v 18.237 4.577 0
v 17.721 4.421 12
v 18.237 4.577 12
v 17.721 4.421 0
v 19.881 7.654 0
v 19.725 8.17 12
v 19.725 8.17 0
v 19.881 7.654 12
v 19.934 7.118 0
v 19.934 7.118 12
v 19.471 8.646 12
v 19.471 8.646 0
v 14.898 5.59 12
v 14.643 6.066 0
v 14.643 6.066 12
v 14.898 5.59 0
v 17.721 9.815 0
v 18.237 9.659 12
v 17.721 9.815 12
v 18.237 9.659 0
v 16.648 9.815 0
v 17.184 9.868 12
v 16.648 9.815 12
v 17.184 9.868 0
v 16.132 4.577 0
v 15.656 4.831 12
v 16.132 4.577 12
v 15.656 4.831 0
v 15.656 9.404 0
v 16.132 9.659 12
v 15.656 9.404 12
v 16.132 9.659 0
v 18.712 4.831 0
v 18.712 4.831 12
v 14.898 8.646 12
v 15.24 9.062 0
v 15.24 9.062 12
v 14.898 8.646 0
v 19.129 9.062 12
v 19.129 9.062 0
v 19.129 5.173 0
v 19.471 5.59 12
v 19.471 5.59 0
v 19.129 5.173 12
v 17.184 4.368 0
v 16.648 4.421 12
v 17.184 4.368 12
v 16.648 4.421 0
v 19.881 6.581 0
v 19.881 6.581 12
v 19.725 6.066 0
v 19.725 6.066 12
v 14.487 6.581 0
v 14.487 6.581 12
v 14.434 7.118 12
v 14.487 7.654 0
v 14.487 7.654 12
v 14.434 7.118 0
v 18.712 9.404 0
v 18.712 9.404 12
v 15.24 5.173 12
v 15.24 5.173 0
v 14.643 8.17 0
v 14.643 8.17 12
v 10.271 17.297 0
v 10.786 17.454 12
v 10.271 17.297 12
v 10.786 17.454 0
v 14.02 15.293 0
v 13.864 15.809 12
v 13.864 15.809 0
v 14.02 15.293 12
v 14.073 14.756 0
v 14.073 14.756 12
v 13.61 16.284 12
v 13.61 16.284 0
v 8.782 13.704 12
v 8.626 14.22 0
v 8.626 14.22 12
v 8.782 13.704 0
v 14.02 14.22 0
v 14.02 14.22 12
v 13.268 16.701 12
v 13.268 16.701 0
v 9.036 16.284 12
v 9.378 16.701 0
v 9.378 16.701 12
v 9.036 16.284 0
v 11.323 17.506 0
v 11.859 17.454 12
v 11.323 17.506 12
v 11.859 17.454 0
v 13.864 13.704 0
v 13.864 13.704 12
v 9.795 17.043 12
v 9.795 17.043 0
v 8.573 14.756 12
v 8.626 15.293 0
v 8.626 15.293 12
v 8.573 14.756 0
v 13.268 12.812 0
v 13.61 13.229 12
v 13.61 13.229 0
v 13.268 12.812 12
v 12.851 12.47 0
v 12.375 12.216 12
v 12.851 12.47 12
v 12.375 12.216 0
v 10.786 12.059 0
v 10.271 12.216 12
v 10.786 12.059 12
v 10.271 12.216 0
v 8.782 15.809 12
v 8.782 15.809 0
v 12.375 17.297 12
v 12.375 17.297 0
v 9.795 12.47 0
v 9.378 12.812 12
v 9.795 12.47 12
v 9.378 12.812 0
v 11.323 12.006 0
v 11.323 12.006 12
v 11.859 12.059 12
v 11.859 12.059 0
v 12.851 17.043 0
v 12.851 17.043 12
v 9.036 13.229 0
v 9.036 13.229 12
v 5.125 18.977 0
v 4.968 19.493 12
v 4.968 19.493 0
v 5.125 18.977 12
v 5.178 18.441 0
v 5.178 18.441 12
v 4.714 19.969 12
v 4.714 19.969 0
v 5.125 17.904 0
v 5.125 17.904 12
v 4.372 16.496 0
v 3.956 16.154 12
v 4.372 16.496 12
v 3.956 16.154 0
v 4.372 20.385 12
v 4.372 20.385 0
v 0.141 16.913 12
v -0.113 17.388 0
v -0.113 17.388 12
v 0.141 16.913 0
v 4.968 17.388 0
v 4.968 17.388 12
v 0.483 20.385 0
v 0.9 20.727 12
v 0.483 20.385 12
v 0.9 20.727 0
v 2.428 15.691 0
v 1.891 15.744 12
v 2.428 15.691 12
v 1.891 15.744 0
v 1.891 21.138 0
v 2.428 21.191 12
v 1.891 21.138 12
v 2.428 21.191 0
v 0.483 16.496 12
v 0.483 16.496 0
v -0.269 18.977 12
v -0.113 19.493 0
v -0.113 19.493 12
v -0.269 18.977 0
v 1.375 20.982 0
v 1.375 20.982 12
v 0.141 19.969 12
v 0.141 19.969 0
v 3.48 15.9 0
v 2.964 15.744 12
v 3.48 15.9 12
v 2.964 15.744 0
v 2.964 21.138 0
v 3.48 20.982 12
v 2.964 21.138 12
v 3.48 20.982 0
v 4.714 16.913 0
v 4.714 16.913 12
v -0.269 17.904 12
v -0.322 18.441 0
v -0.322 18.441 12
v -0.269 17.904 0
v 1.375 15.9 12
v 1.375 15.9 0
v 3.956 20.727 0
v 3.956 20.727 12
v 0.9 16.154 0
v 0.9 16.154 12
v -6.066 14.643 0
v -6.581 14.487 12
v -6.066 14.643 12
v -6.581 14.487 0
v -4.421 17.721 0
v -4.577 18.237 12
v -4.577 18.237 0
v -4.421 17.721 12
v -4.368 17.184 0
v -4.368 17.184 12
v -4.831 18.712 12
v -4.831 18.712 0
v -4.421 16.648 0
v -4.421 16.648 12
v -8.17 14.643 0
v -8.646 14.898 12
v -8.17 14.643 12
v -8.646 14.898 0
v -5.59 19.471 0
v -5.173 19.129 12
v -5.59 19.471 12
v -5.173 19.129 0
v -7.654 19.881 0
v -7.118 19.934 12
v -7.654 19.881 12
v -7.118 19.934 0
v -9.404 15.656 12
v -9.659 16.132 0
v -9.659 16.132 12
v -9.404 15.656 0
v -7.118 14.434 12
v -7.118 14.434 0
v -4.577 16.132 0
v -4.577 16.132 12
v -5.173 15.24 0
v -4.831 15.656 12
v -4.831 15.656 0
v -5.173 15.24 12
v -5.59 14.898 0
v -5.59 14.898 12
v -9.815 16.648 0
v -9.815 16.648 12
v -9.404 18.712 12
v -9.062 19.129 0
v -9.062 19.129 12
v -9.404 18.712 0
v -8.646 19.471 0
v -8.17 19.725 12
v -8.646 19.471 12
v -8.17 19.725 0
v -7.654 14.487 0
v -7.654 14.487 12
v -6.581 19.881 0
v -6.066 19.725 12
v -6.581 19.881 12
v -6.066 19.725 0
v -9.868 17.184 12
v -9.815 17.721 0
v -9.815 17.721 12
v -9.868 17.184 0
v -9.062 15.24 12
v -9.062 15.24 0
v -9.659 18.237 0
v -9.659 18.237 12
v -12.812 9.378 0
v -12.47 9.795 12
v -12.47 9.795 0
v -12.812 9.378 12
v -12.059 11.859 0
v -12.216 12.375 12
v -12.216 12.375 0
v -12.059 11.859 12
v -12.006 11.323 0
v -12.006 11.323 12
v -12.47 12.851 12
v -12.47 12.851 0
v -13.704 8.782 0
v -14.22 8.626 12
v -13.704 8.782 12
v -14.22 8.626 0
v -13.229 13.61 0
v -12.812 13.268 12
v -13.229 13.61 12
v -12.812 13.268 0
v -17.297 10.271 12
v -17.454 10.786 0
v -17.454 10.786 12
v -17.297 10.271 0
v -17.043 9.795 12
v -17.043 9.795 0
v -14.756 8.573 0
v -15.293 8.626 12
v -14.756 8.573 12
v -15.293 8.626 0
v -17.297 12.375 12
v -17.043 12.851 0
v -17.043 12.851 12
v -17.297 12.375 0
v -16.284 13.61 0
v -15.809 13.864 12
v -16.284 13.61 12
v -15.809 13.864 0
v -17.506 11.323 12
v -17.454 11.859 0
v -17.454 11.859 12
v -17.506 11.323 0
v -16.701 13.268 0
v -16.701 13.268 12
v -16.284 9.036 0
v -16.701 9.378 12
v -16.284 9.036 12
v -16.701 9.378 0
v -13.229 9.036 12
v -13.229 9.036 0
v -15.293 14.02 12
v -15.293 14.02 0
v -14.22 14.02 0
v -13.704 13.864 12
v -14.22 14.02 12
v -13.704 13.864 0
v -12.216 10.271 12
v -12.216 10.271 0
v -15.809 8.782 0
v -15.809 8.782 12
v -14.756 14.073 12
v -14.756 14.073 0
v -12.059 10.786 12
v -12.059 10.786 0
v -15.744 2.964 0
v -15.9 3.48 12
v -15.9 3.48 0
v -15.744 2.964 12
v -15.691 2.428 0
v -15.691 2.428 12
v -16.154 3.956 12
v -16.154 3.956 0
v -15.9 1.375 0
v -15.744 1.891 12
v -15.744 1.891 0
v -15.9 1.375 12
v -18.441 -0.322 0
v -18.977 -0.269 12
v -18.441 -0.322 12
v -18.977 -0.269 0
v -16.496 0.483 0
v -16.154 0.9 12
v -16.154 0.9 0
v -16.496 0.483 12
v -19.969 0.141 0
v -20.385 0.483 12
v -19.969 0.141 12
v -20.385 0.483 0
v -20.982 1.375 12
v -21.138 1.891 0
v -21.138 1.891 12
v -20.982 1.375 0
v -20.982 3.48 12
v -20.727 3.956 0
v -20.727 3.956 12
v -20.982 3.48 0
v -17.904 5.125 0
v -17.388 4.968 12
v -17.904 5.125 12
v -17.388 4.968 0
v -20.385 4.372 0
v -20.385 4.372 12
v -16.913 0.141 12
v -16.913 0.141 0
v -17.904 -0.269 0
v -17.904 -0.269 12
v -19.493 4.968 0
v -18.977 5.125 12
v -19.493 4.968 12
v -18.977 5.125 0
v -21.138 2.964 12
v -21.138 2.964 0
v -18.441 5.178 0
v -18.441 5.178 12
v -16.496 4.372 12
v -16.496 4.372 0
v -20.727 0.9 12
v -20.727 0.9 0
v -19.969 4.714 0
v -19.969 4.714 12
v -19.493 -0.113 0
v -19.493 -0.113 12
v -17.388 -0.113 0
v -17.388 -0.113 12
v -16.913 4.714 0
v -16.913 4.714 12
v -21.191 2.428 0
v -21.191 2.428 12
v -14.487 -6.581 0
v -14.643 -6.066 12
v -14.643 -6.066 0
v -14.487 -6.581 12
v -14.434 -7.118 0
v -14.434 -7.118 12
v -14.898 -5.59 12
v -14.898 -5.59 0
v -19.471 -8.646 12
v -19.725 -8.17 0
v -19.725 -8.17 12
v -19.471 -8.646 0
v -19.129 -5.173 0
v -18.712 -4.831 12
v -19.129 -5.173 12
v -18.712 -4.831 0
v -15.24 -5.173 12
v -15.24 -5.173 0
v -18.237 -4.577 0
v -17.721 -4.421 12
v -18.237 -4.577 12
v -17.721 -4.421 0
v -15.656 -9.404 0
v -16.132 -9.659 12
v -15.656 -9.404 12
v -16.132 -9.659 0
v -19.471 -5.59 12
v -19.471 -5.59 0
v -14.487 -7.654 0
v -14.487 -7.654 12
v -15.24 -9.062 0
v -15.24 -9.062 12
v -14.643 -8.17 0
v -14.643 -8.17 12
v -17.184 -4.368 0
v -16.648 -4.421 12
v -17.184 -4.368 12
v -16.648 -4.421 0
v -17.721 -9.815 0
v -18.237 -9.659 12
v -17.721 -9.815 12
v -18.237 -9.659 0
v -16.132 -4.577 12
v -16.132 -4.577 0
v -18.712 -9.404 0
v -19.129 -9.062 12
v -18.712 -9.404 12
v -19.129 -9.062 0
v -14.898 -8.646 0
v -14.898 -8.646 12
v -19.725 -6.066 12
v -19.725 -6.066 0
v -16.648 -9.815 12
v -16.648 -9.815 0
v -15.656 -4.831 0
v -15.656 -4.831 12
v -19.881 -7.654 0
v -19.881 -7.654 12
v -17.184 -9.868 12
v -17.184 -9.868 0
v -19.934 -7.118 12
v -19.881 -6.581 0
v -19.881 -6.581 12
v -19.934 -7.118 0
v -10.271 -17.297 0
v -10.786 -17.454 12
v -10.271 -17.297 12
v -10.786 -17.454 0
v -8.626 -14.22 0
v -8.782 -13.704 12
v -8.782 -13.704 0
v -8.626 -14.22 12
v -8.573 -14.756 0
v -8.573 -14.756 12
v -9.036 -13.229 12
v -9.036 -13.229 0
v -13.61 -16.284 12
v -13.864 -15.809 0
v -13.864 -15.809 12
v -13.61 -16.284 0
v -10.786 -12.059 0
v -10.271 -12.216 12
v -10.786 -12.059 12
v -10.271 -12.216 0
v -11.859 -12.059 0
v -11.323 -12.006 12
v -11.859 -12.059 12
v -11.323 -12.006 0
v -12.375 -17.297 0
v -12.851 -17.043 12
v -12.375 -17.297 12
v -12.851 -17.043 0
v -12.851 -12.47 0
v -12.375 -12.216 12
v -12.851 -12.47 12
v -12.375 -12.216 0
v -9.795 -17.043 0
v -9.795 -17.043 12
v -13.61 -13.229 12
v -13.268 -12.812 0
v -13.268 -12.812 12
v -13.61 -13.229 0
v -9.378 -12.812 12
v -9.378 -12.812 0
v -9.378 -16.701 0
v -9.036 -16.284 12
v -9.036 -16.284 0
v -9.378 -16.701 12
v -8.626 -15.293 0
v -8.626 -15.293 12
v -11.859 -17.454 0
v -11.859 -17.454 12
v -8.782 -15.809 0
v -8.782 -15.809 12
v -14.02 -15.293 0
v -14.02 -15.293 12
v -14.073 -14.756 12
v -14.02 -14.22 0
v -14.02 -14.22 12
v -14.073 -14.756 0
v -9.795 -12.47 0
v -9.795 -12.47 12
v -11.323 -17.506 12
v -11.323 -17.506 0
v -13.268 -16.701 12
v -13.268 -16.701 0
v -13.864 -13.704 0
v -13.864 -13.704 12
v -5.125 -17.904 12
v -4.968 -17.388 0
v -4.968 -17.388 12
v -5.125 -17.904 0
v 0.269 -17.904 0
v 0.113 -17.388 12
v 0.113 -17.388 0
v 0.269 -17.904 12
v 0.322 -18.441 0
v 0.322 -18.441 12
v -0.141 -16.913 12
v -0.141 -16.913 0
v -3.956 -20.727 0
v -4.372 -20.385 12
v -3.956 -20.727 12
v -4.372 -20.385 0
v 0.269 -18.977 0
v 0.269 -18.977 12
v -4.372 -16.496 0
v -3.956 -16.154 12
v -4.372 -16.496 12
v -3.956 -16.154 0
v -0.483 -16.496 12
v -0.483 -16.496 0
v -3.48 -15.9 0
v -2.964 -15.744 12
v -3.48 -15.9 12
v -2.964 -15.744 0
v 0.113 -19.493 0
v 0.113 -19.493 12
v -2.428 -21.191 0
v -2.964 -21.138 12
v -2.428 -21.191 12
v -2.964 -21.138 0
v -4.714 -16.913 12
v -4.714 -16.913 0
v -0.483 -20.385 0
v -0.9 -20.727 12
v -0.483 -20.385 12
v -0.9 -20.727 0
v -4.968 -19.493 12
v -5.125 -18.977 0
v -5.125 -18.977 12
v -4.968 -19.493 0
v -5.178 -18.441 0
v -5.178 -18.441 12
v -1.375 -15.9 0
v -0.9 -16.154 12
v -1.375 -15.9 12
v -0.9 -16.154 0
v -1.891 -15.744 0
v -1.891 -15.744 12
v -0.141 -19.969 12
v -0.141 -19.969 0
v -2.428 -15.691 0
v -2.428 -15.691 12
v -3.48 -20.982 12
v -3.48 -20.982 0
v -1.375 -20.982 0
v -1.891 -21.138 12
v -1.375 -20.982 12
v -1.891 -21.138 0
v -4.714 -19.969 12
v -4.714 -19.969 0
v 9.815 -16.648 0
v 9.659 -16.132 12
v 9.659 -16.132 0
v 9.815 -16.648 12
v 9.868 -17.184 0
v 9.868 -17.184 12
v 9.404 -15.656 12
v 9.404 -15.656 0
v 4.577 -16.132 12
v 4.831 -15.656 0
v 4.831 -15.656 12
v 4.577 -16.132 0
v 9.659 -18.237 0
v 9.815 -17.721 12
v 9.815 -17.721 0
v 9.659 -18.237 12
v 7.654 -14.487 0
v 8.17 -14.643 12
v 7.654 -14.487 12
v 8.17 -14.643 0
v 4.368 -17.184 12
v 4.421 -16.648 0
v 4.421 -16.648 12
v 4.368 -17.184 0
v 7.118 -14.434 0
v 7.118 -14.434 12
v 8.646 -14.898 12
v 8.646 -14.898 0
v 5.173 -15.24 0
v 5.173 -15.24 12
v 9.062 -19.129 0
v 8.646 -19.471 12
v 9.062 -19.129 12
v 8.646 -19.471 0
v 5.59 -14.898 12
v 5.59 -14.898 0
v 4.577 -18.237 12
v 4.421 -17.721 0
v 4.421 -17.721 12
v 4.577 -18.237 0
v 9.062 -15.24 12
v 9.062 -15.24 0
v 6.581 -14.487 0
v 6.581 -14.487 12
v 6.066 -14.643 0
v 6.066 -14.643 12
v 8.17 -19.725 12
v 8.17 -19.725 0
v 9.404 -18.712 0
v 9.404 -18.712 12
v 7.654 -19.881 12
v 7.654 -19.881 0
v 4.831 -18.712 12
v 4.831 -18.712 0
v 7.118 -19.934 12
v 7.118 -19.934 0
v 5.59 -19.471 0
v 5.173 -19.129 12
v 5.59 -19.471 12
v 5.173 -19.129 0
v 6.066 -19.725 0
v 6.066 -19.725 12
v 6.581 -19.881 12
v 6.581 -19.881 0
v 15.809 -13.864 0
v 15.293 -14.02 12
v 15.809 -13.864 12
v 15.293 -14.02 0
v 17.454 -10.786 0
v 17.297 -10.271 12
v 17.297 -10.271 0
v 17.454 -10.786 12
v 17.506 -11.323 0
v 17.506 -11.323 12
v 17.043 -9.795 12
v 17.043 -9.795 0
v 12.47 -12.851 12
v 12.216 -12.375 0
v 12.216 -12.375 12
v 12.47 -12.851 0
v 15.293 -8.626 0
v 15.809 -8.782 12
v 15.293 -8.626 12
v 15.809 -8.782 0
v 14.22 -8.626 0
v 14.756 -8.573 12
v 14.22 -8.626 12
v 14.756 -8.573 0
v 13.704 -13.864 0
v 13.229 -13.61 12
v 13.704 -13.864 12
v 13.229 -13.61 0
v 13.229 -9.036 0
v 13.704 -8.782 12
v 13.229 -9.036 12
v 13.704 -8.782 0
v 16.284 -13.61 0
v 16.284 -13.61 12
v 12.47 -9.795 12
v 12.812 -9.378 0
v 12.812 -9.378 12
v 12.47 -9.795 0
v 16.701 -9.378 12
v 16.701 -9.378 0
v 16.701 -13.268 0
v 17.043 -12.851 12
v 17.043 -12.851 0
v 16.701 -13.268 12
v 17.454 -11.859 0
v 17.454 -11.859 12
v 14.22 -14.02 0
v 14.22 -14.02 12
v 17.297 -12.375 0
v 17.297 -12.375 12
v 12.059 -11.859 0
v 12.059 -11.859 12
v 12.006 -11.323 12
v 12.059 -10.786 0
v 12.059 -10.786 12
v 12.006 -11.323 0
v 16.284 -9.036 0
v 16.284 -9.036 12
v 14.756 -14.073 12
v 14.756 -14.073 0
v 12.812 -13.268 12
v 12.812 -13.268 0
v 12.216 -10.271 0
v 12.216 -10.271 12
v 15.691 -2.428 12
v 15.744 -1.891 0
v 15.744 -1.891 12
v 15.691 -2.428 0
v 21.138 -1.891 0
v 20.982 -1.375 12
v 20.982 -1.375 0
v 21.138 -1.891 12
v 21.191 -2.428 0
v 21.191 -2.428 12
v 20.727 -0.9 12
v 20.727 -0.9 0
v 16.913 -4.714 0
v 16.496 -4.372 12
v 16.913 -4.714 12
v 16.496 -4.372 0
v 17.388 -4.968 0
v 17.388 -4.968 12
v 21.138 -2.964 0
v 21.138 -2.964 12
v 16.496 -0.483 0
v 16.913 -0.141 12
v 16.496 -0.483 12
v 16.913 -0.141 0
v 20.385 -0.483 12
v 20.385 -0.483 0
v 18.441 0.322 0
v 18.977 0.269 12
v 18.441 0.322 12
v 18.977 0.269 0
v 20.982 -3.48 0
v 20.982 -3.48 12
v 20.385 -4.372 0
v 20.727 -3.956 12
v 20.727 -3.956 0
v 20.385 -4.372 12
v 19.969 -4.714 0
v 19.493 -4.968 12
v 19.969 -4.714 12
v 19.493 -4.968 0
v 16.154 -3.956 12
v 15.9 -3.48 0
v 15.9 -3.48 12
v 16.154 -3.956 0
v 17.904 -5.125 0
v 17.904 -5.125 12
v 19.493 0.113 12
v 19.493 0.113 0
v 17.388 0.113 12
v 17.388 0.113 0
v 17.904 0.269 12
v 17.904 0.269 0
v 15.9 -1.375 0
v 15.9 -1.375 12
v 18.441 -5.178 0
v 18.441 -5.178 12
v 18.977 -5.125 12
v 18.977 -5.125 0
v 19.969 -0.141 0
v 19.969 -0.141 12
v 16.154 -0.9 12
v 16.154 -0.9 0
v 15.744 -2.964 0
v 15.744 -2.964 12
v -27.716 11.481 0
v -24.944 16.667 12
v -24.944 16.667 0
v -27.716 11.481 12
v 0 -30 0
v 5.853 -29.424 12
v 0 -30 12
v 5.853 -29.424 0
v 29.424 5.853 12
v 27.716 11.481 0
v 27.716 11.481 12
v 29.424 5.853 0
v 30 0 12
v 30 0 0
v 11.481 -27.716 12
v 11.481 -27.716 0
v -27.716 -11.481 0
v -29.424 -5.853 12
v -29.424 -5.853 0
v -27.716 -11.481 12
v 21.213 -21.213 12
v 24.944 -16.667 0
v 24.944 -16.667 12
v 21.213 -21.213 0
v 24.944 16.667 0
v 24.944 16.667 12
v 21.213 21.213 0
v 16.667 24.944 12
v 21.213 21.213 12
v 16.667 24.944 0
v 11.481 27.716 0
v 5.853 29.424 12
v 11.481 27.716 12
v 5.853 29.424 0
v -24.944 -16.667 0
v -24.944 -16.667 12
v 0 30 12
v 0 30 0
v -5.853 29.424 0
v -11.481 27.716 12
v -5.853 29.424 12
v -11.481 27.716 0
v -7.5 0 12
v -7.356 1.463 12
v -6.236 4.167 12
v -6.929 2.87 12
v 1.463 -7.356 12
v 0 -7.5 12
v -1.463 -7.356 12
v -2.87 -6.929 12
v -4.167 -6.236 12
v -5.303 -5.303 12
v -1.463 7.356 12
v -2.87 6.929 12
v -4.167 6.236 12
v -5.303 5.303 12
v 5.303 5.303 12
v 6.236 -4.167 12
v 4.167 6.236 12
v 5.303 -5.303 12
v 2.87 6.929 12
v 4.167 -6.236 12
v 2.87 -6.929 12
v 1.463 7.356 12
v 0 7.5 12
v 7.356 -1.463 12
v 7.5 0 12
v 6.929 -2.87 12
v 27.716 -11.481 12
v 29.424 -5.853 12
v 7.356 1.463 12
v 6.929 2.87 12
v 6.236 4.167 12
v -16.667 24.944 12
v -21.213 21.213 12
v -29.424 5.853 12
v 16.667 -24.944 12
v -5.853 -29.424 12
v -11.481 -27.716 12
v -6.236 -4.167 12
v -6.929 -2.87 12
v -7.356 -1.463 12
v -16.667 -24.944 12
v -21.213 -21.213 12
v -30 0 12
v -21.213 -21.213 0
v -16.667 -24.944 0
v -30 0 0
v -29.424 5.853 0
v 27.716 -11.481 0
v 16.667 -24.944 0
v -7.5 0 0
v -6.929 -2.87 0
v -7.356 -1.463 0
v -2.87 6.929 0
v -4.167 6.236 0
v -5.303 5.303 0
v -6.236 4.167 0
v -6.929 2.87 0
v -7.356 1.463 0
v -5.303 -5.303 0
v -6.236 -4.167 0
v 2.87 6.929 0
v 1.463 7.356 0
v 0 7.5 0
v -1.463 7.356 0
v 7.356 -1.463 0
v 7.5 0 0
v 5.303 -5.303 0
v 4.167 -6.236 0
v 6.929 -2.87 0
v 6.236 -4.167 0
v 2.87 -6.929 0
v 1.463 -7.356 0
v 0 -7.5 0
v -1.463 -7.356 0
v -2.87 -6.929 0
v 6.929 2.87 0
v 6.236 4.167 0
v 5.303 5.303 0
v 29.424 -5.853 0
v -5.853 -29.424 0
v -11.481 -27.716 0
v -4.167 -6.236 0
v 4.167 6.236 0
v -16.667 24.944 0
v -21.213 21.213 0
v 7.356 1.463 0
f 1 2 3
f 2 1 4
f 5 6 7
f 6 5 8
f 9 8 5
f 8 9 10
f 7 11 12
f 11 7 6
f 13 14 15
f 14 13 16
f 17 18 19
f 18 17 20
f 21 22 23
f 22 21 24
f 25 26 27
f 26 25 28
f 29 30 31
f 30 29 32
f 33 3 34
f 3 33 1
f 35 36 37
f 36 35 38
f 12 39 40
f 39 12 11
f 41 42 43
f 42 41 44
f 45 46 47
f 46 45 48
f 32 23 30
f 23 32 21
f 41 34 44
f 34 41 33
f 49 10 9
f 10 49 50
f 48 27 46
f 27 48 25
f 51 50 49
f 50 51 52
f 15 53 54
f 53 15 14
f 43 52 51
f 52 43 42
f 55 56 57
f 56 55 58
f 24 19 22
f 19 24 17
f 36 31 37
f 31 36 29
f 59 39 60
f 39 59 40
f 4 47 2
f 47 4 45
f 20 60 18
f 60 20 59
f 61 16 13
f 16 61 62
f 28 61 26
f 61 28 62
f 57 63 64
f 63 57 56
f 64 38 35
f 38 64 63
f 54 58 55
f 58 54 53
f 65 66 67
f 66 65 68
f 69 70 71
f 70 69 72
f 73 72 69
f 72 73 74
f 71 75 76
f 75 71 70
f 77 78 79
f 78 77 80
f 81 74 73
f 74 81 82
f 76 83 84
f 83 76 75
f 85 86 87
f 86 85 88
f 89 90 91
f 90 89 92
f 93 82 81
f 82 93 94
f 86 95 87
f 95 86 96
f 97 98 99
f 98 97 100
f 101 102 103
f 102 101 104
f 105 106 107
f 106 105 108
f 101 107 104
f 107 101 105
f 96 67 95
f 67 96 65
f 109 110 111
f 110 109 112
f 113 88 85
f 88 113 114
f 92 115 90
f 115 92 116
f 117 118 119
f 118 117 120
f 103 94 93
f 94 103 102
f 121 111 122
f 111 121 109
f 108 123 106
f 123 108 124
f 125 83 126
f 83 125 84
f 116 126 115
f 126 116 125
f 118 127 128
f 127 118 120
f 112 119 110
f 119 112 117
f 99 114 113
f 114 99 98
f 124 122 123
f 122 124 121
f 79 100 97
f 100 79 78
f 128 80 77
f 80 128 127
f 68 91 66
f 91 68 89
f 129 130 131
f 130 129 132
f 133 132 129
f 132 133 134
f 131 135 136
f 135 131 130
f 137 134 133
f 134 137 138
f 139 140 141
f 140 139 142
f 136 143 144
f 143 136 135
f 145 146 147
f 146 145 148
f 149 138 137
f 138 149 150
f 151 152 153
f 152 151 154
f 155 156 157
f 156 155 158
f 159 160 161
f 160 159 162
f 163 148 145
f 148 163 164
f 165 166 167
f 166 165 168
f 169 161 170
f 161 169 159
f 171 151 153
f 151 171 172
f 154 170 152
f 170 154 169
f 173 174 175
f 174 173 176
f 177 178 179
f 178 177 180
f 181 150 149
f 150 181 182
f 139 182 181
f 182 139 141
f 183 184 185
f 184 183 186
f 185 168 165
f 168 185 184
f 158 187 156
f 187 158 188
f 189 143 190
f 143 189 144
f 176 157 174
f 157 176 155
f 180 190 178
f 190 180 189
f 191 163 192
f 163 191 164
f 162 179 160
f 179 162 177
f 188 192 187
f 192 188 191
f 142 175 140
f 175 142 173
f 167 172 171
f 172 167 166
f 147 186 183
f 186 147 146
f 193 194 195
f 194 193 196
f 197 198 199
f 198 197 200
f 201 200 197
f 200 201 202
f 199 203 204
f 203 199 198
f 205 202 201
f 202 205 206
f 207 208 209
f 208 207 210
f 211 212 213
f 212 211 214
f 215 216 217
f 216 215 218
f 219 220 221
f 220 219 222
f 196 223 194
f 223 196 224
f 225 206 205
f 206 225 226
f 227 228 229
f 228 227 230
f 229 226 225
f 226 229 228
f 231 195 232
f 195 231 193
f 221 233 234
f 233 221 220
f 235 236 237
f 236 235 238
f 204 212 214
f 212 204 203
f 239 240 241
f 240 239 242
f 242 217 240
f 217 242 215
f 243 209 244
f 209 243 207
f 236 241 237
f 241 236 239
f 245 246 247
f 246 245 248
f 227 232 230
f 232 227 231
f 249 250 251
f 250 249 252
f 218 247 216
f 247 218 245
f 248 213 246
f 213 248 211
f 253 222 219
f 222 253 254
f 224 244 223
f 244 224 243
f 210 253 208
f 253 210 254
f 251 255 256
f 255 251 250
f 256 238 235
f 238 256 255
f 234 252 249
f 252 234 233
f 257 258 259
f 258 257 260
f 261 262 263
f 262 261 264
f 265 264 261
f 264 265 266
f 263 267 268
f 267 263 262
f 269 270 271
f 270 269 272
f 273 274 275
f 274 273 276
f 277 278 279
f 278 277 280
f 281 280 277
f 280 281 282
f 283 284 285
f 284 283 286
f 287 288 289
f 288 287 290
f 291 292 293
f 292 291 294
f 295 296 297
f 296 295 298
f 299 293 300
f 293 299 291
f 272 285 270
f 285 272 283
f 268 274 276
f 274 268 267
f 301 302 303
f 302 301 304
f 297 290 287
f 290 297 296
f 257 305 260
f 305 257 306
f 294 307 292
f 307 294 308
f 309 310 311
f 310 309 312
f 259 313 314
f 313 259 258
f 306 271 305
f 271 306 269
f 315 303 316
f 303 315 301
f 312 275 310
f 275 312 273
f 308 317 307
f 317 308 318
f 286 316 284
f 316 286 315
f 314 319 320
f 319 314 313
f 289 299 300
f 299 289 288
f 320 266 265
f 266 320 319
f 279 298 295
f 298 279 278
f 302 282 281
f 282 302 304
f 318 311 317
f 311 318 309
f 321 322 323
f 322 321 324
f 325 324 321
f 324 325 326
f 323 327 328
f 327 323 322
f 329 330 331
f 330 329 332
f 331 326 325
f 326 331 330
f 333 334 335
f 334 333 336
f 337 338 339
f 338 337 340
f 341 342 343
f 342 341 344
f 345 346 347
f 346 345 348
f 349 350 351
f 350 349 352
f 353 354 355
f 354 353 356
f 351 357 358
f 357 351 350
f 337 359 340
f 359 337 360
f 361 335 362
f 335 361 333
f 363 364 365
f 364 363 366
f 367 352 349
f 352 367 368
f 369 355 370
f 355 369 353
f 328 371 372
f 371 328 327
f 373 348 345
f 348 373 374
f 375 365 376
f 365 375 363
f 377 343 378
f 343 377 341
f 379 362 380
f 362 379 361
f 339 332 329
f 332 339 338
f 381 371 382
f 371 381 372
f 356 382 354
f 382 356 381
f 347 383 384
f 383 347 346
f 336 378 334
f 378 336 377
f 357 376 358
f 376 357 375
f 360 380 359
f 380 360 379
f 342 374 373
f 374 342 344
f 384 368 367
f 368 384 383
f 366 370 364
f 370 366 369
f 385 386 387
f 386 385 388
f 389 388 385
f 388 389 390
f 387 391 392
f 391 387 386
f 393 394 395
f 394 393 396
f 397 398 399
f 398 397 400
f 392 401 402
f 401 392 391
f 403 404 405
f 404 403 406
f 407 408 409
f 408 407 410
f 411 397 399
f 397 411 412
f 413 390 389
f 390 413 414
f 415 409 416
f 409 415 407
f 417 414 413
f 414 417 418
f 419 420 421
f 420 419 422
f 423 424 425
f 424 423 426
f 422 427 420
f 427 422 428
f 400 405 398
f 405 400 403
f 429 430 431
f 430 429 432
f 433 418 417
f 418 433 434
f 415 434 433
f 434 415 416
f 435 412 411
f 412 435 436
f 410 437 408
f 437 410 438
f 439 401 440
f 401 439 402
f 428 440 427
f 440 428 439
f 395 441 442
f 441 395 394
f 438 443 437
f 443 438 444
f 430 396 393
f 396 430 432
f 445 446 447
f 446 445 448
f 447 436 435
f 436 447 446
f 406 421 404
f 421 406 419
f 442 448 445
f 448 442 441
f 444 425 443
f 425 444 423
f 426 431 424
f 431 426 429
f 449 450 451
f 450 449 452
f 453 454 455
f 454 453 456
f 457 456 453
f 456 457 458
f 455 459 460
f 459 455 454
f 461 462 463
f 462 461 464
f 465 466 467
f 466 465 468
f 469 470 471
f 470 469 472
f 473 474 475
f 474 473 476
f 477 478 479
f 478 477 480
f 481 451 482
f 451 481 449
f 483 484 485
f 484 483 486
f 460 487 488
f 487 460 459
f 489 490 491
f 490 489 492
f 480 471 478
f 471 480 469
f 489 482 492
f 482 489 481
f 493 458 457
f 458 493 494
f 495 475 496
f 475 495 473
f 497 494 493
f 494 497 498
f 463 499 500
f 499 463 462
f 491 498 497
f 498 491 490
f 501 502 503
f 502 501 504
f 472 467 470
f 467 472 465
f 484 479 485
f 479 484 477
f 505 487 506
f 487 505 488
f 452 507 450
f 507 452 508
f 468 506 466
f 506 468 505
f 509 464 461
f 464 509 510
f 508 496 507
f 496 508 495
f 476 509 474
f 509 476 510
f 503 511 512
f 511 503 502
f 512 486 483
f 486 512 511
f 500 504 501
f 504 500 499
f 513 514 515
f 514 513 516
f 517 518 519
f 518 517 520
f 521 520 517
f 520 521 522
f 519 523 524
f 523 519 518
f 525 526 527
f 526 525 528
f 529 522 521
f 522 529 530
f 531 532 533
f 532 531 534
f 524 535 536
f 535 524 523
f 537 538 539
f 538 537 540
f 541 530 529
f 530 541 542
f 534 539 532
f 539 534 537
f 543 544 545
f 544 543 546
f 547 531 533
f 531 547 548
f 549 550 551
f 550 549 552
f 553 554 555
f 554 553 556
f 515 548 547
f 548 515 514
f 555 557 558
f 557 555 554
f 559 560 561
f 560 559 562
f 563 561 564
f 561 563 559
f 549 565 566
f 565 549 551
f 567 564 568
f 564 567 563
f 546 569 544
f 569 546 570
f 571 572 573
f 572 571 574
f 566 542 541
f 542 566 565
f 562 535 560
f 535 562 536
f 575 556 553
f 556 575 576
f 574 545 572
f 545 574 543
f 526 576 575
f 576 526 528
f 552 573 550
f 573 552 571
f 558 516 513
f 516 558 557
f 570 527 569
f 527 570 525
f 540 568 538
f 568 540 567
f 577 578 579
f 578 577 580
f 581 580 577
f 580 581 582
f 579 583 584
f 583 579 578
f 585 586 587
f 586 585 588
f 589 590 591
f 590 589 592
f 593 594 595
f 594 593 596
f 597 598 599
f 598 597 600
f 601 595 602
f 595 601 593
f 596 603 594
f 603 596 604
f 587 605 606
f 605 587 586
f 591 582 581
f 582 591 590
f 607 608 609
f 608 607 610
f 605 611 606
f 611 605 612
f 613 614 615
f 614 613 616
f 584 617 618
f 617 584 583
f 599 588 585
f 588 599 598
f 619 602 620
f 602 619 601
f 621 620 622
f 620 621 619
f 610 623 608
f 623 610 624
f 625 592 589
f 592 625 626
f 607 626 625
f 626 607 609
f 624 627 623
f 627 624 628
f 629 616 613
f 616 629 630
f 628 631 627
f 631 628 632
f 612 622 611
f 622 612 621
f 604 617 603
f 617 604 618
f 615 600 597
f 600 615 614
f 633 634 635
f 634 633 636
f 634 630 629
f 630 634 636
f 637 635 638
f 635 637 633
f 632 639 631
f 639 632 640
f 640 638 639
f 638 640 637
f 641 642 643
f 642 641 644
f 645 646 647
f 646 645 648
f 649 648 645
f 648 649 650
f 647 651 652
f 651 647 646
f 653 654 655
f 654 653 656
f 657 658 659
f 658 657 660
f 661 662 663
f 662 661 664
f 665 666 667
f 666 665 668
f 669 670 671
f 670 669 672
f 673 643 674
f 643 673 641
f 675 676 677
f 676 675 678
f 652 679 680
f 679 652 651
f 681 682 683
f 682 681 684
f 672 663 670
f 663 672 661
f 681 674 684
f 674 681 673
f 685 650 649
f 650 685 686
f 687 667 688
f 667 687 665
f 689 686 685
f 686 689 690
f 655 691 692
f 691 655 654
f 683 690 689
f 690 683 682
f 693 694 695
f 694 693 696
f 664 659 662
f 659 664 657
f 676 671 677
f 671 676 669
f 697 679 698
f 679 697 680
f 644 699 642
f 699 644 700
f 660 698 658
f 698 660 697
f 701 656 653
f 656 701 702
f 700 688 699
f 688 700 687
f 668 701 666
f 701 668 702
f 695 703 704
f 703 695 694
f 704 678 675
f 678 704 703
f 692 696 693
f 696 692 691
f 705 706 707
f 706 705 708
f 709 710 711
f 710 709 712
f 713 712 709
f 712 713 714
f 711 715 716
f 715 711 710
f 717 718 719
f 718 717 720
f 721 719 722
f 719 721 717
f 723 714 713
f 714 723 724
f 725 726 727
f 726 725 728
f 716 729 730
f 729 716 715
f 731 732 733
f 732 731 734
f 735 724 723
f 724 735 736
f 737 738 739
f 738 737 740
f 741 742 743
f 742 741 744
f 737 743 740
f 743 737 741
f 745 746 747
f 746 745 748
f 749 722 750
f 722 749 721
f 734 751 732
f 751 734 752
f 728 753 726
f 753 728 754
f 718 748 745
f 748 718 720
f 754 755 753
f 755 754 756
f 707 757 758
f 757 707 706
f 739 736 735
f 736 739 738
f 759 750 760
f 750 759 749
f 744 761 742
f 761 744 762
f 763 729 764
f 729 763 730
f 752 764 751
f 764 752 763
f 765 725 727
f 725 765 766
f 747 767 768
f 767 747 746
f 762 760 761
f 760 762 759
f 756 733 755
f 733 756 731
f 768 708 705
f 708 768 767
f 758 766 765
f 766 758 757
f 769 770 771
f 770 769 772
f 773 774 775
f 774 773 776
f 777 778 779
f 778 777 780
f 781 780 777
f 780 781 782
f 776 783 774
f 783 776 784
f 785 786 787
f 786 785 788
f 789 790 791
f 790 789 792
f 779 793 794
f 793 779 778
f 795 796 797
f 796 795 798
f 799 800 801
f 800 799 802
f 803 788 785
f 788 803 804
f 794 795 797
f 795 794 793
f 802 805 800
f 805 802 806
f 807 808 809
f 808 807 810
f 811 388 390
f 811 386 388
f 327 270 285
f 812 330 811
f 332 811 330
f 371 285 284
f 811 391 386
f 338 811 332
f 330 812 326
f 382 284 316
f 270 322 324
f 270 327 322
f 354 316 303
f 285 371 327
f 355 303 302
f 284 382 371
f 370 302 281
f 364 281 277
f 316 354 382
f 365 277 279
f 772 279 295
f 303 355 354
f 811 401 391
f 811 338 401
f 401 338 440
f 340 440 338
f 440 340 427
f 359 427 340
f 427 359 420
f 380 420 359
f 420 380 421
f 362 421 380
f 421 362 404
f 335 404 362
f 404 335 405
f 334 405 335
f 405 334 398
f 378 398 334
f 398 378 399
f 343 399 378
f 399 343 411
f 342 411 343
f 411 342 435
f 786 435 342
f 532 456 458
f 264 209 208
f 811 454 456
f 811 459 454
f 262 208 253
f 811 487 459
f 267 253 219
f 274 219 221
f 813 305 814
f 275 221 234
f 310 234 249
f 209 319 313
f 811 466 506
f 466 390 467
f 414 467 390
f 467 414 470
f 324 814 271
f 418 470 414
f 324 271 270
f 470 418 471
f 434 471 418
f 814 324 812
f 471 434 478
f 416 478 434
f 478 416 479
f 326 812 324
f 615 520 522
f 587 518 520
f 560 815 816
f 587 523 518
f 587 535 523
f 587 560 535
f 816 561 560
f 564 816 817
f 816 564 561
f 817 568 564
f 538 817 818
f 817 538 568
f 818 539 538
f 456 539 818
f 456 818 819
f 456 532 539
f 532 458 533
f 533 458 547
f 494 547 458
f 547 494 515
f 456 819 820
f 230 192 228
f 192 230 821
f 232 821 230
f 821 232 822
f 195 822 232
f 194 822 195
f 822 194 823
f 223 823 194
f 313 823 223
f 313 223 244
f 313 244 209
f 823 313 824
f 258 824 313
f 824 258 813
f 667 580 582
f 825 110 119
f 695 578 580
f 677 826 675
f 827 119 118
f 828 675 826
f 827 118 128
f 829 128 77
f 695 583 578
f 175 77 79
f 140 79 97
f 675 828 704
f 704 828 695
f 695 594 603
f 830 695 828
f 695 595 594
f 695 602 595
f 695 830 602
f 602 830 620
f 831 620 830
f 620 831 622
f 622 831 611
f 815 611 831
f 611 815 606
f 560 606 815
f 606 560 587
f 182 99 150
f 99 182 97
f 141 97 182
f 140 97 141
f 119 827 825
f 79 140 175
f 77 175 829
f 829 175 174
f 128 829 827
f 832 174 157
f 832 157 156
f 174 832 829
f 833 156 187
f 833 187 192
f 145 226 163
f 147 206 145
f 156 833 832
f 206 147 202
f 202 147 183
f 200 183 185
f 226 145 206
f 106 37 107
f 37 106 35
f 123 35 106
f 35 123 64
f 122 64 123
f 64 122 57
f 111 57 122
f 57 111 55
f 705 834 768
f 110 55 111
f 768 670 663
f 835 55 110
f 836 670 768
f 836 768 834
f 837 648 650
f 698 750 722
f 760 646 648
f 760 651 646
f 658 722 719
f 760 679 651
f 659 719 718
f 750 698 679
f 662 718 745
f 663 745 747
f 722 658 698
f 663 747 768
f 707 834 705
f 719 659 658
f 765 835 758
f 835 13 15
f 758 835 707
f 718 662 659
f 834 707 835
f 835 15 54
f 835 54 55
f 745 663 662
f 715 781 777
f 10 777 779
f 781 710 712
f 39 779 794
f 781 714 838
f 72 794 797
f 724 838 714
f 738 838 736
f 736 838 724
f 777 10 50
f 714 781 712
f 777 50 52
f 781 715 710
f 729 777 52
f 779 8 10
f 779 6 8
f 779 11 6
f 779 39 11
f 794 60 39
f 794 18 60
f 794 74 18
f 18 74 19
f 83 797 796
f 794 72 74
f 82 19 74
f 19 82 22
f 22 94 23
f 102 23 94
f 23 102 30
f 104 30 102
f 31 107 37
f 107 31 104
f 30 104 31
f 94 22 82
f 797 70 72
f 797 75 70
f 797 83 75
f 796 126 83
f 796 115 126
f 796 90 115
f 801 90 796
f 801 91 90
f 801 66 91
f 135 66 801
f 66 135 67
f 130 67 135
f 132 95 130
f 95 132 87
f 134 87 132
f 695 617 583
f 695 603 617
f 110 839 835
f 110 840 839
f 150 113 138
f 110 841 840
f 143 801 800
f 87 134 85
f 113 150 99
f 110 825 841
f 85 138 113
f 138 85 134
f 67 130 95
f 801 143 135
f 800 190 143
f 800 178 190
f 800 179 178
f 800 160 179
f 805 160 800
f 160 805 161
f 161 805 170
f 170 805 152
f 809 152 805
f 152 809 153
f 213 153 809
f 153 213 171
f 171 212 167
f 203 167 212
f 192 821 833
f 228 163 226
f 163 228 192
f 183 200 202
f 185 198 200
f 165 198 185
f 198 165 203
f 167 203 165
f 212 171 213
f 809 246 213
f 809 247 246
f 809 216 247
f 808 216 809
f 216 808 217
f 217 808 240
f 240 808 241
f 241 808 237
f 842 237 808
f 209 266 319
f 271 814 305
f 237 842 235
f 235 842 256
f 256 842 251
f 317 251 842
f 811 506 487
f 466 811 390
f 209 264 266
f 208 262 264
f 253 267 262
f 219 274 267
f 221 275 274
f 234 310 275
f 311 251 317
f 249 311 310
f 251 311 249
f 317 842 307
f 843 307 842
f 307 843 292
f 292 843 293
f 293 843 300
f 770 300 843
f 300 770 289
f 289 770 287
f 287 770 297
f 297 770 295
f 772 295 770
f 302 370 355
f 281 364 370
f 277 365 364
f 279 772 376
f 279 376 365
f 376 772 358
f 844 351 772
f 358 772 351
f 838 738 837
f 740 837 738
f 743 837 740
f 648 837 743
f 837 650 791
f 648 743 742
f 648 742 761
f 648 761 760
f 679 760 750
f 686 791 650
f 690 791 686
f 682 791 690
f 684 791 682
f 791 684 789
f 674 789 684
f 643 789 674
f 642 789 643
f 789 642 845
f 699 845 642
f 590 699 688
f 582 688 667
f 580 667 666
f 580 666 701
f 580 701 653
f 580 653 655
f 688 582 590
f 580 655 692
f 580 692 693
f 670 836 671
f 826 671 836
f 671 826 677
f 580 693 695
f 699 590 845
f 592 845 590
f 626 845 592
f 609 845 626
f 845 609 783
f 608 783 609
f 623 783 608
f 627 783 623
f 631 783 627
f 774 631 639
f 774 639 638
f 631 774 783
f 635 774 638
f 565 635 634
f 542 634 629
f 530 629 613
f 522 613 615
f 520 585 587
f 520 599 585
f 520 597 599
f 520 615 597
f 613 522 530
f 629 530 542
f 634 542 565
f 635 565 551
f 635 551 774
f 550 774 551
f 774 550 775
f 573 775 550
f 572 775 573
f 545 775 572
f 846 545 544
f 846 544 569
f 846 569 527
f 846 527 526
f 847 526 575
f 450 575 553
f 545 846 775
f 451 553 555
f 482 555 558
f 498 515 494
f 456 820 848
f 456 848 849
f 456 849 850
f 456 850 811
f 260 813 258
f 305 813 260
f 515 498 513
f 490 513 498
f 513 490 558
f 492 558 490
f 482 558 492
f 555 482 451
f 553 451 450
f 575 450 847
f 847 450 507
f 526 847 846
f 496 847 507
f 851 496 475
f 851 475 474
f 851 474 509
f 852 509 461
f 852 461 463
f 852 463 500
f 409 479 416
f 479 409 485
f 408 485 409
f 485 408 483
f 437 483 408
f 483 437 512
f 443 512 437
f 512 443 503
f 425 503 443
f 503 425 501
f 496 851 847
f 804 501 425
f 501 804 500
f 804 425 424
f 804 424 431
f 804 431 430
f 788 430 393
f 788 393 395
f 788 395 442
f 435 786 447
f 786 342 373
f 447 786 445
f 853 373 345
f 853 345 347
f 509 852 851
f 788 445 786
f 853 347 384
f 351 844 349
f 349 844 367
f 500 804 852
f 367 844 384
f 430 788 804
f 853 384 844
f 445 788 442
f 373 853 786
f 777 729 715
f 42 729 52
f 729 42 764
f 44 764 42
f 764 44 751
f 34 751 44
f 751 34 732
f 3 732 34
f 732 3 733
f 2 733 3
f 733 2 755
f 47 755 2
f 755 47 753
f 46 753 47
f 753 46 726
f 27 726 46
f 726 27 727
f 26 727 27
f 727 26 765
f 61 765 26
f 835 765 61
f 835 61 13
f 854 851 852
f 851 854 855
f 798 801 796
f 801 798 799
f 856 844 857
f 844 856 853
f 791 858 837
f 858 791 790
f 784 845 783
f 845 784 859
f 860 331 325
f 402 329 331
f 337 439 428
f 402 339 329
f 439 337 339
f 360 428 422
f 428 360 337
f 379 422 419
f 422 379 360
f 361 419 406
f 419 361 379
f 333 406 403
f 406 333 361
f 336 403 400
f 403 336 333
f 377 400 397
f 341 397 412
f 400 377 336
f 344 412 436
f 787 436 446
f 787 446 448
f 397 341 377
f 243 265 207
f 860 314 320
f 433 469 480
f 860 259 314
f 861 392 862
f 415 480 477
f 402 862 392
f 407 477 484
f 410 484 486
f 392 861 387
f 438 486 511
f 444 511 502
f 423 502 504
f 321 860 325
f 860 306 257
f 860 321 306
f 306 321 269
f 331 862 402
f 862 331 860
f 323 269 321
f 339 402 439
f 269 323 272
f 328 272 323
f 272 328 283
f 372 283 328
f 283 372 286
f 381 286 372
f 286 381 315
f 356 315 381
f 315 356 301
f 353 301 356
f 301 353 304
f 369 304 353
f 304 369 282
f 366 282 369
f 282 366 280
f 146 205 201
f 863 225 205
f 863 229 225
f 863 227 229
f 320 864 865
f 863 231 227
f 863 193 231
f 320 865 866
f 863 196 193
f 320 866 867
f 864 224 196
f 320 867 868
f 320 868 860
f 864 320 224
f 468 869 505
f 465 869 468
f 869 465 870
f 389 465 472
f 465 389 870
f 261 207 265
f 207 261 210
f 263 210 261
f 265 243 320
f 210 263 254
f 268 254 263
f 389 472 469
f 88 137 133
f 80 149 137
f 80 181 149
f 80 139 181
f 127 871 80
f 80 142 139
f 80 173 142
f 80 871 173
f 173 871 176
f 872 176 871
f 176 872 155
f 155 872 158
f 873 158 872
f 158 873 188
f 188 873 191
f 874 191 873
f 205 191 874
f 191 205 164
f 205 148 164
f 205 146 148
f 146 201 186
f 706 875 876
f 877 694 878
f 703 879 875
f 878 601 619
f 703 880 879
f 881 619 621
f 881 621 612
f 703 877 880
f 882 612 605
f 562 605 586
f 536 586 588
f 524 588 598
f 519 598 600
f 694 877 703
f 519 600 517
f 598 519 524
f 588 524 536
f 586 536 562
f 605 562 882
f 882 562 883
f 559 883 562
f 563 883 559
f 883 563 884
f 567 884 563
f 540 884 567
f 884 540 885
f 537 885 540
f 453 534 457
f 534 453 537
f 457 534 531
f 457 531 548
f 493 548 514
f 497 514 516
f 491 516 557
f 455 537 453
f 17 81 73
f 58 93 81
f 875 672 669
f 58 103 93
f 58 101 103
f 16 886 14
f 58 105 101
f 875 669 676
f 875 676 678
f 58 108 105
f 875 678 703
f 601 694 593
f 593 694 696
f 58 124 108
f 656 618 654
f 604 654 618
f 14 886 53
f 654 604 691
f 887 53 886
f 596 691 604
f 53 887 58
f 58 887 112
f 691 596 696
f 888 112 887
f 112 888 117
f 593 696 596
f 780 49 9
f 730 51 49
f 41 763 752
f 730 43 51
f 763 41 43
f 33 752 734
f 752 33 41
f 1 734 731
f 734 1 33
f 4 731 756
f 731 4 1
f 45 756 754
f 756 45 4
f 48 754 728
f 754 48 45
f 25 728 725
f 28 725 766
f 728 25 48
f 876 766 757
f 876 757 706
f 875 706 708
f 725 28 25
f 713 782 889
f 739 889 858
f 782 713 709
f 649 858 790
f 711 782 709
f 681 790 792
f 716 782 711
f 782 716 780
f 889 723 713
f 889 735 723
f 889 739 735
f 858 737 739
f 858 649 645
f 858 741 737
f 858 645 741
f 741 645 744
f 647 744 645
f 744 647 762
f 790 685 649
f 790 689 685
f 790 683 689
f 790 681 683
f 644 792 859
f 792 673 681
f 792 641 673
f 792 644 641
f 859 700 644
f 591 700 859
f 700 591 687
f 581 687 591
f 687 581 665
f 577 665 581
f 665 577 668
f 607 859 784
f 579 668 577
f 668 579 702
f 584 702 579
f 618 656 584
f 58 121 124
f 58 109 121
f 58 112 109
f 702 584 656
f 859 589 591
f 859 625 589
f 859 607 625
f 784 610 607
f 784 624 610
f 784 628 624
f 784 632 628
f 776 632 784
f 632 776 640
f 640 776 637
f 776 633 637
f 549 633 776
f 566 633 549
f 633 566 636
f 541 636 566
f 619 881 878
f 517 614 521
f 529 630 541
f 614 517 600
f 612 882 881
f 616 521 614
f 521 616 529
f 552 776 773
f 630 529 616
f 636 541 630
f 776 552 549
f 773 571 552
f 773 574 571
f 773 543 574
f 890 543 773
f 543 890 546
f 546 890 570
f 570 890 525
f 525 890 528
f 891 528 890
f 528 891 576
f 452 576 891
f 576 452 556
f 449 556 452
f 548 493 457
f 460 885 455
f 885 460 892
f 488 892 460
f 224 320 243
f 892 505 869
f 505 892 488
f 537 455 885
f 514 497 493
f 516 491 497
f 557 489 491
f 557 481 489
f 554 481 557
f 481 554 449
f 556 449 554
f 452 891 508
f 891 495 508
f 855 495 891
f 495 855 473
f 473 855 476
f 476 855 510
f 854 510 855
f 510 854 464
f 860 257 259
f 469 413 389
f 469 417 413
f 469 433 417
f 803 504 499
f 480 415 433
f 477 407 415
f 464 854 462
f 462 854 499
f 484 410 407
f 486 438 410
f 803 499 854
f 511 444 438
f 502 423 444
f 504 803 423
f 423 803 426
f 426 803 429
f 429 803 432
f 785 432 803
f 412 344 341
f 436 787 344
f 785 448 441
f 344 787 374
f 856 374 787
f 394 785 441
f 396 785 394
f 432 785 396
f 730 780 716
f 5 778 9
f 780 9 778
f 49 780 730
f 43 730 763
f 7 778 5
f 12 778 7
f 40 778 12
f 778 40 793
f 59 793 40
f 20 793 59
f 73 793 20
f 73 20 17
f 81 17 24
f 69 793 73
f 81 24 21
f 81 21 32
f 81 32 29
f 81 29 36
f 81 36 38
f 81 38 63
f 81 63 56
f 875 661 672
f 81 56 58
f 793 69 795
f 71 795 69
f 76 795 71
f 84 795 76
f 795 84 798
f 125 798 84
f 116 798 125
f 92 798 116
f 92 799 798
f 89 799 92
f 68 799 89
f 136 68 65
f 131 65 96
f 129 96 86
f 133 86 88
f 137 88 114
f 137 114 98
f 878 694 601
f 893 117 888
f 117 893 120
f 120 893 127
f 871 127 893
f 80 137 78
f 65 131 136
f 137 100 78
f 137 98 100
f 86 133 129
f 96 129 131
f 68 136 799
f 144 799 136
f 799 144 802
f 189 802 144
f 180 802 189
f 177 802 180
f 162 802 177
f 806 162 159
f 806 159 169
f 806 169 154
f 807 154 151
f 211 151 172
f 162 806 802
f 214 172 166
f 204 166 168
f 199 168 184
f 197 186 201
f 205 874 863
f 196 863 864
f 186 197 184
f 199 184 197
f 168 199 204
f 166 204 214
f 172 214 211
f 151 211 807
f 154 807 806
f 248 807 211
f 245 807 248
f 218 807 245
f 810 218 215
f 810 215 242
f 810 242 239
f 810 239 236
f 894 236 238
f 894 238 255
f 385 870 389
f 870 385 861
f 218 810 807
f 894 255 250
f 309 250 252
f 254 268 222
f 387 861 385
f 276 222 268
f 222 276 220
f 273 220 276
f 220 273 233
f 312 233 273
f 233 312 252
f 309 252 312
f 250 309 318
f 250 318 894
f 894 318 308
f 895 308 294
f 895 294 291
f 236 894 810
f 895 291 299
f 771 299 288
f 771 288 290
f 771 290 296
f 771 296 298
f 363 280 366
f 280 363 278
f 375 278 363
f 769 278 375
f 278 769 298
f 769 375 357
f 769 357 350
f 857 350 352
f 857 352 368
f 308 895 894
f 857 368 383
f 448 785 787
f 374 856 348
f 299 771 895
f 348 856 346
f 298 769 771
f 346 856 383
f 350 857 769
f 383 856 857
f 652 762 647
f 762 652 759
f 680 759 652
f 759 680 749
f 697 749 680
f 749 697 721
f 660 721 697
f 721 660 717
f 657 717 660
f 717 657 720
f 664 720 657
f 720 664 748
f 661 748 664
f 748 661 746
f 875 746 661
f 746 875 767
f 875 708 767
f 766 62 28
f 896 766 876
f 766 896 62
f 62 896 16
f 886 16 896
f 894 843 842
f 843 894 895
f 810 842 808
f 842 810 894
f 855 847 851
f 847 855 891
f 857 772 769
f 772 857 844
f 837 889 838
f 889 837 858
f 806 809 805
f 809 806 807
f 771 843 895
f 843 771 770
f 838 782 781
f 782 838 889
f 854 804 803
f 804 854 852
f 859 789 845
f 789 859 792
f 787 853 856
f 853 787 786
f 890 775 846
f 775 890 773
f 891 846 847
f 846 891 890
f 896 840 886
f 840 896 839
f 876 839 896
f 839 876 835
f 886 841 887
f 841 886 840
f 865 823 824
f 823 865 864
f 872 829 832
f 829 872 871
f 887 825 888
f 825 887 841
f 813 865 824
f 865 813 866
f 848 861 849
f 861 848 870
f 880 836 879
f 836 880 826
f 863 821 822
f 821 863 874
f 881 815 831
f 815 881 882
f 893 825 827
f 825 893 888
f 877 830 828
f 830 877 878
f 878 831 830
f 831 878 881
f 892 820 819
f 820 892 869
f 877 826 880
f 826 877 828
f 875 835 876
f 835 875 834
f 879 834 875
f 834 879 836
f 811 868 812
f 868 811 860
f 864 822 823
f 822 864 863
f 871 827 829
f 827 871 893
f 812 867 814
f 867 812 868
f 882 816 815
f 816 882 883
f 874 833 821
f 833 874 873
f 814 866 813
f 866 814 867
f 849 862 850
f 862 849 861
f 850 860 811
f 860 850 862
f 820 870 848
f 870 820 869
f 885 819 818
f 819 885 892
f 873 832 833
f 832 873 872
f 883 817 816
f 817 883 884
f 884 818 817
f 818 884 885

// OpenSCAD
$fn = 32;

// ----------------------------------------------------------------------
// Flange Ø60 x 12
// 12 holes on a Ø37.2 bolt circle, bolted joints
// ----------------------------------------------------------------------

// --- parameters (mm) ---
flange_d = 60;     // outside diameter of the flange
thickness = 12;    // flange thickness
holes = 12;        // number of bolt holes
pcd = 37.2;        // bolt circle diameter
start_deg = 22.5;  // angle of the first hole, from +X
hole_d = 5.5;      // bolt hole diameter
bore_d = 15;       // central through bore
hub_d = 25;        // hub outside diameter
hub_h = 0;         // hub height above the flange face (0 = no hub)

// --- derived feature positions (mm) ---
height = thickness + hub_h;  // = 12   overall height of the part
pcd_r = pcd / 2;             // = 18.6   bolt circle radius
hole_step = 360 / holes;     // = 30   angular pitch
feature_centers = [
  [pcd_r * cos(start_deg + 0 * hole_step), pcd_r * sin(start_deg + 0 * hole_step)],
  [pcd_r * cos(start_deg + 1 * hole_step), pcd_r * sin(start_deg + 1 * hole_step)],
  [pcd_r * cos(start_deg + 2 * hole_step), pcd_r * sin(start_deg + 2 * hole_step)],
  [pcd_r * cos(start_deg + 3 * hole_step), pcd_r * sin(start_deg + 3 * hole_step)],
  [pcd_r * cos(start_deg + 4 * hole_step), pcd_r * sin(start_deg + 4 * hole_step)],
  [pcd_r * cos(start_deg + 5 * hole_step), pcd_r * sin(start_deg + 5 * hole_step)],
  [pcd_r * cos(start_deg + 6 * hole_step), pcd_r * sin(start_deg + 6 * hole_step)],
  [pcd_r * cos(start_deg + 7 * hole_step), pcd_r * sin(start_deg + 7 * hole_step)],
  [pcd_r * cos(start_deg + 8 * hole_step), pcd_r * sin(start_deg + 8 * hole_step)],
  [pcd_r * cos(start_deg + 9 * hole_step), pcd_r * sin(start_deg + 9 * hole_step)],
  [pcd_r * cos(start_deg + 10 * hole_step), pcd_r * sin(start_deg + 10 * hole_step)],
  [pcd_r * cos(start_deg + 11 * hole_step), pcd_r * sin(start_deg + 11 * hole_step)]
];   // bolt hole centres on the pitch circle

// flange disc, every hole and the bore cut straight through
difference() {
  union() {
    cylinder(d = flange_d, h = thickness);
  }
  translate([0, 0, -1]) cylinder(d = bore_d, h = height + 2);  // bore, through
  for (centre = feature_centers)
    translate([centre[0], centre[1], -1]) cylinder(d = hole_d, h = thickness + 2);
}
